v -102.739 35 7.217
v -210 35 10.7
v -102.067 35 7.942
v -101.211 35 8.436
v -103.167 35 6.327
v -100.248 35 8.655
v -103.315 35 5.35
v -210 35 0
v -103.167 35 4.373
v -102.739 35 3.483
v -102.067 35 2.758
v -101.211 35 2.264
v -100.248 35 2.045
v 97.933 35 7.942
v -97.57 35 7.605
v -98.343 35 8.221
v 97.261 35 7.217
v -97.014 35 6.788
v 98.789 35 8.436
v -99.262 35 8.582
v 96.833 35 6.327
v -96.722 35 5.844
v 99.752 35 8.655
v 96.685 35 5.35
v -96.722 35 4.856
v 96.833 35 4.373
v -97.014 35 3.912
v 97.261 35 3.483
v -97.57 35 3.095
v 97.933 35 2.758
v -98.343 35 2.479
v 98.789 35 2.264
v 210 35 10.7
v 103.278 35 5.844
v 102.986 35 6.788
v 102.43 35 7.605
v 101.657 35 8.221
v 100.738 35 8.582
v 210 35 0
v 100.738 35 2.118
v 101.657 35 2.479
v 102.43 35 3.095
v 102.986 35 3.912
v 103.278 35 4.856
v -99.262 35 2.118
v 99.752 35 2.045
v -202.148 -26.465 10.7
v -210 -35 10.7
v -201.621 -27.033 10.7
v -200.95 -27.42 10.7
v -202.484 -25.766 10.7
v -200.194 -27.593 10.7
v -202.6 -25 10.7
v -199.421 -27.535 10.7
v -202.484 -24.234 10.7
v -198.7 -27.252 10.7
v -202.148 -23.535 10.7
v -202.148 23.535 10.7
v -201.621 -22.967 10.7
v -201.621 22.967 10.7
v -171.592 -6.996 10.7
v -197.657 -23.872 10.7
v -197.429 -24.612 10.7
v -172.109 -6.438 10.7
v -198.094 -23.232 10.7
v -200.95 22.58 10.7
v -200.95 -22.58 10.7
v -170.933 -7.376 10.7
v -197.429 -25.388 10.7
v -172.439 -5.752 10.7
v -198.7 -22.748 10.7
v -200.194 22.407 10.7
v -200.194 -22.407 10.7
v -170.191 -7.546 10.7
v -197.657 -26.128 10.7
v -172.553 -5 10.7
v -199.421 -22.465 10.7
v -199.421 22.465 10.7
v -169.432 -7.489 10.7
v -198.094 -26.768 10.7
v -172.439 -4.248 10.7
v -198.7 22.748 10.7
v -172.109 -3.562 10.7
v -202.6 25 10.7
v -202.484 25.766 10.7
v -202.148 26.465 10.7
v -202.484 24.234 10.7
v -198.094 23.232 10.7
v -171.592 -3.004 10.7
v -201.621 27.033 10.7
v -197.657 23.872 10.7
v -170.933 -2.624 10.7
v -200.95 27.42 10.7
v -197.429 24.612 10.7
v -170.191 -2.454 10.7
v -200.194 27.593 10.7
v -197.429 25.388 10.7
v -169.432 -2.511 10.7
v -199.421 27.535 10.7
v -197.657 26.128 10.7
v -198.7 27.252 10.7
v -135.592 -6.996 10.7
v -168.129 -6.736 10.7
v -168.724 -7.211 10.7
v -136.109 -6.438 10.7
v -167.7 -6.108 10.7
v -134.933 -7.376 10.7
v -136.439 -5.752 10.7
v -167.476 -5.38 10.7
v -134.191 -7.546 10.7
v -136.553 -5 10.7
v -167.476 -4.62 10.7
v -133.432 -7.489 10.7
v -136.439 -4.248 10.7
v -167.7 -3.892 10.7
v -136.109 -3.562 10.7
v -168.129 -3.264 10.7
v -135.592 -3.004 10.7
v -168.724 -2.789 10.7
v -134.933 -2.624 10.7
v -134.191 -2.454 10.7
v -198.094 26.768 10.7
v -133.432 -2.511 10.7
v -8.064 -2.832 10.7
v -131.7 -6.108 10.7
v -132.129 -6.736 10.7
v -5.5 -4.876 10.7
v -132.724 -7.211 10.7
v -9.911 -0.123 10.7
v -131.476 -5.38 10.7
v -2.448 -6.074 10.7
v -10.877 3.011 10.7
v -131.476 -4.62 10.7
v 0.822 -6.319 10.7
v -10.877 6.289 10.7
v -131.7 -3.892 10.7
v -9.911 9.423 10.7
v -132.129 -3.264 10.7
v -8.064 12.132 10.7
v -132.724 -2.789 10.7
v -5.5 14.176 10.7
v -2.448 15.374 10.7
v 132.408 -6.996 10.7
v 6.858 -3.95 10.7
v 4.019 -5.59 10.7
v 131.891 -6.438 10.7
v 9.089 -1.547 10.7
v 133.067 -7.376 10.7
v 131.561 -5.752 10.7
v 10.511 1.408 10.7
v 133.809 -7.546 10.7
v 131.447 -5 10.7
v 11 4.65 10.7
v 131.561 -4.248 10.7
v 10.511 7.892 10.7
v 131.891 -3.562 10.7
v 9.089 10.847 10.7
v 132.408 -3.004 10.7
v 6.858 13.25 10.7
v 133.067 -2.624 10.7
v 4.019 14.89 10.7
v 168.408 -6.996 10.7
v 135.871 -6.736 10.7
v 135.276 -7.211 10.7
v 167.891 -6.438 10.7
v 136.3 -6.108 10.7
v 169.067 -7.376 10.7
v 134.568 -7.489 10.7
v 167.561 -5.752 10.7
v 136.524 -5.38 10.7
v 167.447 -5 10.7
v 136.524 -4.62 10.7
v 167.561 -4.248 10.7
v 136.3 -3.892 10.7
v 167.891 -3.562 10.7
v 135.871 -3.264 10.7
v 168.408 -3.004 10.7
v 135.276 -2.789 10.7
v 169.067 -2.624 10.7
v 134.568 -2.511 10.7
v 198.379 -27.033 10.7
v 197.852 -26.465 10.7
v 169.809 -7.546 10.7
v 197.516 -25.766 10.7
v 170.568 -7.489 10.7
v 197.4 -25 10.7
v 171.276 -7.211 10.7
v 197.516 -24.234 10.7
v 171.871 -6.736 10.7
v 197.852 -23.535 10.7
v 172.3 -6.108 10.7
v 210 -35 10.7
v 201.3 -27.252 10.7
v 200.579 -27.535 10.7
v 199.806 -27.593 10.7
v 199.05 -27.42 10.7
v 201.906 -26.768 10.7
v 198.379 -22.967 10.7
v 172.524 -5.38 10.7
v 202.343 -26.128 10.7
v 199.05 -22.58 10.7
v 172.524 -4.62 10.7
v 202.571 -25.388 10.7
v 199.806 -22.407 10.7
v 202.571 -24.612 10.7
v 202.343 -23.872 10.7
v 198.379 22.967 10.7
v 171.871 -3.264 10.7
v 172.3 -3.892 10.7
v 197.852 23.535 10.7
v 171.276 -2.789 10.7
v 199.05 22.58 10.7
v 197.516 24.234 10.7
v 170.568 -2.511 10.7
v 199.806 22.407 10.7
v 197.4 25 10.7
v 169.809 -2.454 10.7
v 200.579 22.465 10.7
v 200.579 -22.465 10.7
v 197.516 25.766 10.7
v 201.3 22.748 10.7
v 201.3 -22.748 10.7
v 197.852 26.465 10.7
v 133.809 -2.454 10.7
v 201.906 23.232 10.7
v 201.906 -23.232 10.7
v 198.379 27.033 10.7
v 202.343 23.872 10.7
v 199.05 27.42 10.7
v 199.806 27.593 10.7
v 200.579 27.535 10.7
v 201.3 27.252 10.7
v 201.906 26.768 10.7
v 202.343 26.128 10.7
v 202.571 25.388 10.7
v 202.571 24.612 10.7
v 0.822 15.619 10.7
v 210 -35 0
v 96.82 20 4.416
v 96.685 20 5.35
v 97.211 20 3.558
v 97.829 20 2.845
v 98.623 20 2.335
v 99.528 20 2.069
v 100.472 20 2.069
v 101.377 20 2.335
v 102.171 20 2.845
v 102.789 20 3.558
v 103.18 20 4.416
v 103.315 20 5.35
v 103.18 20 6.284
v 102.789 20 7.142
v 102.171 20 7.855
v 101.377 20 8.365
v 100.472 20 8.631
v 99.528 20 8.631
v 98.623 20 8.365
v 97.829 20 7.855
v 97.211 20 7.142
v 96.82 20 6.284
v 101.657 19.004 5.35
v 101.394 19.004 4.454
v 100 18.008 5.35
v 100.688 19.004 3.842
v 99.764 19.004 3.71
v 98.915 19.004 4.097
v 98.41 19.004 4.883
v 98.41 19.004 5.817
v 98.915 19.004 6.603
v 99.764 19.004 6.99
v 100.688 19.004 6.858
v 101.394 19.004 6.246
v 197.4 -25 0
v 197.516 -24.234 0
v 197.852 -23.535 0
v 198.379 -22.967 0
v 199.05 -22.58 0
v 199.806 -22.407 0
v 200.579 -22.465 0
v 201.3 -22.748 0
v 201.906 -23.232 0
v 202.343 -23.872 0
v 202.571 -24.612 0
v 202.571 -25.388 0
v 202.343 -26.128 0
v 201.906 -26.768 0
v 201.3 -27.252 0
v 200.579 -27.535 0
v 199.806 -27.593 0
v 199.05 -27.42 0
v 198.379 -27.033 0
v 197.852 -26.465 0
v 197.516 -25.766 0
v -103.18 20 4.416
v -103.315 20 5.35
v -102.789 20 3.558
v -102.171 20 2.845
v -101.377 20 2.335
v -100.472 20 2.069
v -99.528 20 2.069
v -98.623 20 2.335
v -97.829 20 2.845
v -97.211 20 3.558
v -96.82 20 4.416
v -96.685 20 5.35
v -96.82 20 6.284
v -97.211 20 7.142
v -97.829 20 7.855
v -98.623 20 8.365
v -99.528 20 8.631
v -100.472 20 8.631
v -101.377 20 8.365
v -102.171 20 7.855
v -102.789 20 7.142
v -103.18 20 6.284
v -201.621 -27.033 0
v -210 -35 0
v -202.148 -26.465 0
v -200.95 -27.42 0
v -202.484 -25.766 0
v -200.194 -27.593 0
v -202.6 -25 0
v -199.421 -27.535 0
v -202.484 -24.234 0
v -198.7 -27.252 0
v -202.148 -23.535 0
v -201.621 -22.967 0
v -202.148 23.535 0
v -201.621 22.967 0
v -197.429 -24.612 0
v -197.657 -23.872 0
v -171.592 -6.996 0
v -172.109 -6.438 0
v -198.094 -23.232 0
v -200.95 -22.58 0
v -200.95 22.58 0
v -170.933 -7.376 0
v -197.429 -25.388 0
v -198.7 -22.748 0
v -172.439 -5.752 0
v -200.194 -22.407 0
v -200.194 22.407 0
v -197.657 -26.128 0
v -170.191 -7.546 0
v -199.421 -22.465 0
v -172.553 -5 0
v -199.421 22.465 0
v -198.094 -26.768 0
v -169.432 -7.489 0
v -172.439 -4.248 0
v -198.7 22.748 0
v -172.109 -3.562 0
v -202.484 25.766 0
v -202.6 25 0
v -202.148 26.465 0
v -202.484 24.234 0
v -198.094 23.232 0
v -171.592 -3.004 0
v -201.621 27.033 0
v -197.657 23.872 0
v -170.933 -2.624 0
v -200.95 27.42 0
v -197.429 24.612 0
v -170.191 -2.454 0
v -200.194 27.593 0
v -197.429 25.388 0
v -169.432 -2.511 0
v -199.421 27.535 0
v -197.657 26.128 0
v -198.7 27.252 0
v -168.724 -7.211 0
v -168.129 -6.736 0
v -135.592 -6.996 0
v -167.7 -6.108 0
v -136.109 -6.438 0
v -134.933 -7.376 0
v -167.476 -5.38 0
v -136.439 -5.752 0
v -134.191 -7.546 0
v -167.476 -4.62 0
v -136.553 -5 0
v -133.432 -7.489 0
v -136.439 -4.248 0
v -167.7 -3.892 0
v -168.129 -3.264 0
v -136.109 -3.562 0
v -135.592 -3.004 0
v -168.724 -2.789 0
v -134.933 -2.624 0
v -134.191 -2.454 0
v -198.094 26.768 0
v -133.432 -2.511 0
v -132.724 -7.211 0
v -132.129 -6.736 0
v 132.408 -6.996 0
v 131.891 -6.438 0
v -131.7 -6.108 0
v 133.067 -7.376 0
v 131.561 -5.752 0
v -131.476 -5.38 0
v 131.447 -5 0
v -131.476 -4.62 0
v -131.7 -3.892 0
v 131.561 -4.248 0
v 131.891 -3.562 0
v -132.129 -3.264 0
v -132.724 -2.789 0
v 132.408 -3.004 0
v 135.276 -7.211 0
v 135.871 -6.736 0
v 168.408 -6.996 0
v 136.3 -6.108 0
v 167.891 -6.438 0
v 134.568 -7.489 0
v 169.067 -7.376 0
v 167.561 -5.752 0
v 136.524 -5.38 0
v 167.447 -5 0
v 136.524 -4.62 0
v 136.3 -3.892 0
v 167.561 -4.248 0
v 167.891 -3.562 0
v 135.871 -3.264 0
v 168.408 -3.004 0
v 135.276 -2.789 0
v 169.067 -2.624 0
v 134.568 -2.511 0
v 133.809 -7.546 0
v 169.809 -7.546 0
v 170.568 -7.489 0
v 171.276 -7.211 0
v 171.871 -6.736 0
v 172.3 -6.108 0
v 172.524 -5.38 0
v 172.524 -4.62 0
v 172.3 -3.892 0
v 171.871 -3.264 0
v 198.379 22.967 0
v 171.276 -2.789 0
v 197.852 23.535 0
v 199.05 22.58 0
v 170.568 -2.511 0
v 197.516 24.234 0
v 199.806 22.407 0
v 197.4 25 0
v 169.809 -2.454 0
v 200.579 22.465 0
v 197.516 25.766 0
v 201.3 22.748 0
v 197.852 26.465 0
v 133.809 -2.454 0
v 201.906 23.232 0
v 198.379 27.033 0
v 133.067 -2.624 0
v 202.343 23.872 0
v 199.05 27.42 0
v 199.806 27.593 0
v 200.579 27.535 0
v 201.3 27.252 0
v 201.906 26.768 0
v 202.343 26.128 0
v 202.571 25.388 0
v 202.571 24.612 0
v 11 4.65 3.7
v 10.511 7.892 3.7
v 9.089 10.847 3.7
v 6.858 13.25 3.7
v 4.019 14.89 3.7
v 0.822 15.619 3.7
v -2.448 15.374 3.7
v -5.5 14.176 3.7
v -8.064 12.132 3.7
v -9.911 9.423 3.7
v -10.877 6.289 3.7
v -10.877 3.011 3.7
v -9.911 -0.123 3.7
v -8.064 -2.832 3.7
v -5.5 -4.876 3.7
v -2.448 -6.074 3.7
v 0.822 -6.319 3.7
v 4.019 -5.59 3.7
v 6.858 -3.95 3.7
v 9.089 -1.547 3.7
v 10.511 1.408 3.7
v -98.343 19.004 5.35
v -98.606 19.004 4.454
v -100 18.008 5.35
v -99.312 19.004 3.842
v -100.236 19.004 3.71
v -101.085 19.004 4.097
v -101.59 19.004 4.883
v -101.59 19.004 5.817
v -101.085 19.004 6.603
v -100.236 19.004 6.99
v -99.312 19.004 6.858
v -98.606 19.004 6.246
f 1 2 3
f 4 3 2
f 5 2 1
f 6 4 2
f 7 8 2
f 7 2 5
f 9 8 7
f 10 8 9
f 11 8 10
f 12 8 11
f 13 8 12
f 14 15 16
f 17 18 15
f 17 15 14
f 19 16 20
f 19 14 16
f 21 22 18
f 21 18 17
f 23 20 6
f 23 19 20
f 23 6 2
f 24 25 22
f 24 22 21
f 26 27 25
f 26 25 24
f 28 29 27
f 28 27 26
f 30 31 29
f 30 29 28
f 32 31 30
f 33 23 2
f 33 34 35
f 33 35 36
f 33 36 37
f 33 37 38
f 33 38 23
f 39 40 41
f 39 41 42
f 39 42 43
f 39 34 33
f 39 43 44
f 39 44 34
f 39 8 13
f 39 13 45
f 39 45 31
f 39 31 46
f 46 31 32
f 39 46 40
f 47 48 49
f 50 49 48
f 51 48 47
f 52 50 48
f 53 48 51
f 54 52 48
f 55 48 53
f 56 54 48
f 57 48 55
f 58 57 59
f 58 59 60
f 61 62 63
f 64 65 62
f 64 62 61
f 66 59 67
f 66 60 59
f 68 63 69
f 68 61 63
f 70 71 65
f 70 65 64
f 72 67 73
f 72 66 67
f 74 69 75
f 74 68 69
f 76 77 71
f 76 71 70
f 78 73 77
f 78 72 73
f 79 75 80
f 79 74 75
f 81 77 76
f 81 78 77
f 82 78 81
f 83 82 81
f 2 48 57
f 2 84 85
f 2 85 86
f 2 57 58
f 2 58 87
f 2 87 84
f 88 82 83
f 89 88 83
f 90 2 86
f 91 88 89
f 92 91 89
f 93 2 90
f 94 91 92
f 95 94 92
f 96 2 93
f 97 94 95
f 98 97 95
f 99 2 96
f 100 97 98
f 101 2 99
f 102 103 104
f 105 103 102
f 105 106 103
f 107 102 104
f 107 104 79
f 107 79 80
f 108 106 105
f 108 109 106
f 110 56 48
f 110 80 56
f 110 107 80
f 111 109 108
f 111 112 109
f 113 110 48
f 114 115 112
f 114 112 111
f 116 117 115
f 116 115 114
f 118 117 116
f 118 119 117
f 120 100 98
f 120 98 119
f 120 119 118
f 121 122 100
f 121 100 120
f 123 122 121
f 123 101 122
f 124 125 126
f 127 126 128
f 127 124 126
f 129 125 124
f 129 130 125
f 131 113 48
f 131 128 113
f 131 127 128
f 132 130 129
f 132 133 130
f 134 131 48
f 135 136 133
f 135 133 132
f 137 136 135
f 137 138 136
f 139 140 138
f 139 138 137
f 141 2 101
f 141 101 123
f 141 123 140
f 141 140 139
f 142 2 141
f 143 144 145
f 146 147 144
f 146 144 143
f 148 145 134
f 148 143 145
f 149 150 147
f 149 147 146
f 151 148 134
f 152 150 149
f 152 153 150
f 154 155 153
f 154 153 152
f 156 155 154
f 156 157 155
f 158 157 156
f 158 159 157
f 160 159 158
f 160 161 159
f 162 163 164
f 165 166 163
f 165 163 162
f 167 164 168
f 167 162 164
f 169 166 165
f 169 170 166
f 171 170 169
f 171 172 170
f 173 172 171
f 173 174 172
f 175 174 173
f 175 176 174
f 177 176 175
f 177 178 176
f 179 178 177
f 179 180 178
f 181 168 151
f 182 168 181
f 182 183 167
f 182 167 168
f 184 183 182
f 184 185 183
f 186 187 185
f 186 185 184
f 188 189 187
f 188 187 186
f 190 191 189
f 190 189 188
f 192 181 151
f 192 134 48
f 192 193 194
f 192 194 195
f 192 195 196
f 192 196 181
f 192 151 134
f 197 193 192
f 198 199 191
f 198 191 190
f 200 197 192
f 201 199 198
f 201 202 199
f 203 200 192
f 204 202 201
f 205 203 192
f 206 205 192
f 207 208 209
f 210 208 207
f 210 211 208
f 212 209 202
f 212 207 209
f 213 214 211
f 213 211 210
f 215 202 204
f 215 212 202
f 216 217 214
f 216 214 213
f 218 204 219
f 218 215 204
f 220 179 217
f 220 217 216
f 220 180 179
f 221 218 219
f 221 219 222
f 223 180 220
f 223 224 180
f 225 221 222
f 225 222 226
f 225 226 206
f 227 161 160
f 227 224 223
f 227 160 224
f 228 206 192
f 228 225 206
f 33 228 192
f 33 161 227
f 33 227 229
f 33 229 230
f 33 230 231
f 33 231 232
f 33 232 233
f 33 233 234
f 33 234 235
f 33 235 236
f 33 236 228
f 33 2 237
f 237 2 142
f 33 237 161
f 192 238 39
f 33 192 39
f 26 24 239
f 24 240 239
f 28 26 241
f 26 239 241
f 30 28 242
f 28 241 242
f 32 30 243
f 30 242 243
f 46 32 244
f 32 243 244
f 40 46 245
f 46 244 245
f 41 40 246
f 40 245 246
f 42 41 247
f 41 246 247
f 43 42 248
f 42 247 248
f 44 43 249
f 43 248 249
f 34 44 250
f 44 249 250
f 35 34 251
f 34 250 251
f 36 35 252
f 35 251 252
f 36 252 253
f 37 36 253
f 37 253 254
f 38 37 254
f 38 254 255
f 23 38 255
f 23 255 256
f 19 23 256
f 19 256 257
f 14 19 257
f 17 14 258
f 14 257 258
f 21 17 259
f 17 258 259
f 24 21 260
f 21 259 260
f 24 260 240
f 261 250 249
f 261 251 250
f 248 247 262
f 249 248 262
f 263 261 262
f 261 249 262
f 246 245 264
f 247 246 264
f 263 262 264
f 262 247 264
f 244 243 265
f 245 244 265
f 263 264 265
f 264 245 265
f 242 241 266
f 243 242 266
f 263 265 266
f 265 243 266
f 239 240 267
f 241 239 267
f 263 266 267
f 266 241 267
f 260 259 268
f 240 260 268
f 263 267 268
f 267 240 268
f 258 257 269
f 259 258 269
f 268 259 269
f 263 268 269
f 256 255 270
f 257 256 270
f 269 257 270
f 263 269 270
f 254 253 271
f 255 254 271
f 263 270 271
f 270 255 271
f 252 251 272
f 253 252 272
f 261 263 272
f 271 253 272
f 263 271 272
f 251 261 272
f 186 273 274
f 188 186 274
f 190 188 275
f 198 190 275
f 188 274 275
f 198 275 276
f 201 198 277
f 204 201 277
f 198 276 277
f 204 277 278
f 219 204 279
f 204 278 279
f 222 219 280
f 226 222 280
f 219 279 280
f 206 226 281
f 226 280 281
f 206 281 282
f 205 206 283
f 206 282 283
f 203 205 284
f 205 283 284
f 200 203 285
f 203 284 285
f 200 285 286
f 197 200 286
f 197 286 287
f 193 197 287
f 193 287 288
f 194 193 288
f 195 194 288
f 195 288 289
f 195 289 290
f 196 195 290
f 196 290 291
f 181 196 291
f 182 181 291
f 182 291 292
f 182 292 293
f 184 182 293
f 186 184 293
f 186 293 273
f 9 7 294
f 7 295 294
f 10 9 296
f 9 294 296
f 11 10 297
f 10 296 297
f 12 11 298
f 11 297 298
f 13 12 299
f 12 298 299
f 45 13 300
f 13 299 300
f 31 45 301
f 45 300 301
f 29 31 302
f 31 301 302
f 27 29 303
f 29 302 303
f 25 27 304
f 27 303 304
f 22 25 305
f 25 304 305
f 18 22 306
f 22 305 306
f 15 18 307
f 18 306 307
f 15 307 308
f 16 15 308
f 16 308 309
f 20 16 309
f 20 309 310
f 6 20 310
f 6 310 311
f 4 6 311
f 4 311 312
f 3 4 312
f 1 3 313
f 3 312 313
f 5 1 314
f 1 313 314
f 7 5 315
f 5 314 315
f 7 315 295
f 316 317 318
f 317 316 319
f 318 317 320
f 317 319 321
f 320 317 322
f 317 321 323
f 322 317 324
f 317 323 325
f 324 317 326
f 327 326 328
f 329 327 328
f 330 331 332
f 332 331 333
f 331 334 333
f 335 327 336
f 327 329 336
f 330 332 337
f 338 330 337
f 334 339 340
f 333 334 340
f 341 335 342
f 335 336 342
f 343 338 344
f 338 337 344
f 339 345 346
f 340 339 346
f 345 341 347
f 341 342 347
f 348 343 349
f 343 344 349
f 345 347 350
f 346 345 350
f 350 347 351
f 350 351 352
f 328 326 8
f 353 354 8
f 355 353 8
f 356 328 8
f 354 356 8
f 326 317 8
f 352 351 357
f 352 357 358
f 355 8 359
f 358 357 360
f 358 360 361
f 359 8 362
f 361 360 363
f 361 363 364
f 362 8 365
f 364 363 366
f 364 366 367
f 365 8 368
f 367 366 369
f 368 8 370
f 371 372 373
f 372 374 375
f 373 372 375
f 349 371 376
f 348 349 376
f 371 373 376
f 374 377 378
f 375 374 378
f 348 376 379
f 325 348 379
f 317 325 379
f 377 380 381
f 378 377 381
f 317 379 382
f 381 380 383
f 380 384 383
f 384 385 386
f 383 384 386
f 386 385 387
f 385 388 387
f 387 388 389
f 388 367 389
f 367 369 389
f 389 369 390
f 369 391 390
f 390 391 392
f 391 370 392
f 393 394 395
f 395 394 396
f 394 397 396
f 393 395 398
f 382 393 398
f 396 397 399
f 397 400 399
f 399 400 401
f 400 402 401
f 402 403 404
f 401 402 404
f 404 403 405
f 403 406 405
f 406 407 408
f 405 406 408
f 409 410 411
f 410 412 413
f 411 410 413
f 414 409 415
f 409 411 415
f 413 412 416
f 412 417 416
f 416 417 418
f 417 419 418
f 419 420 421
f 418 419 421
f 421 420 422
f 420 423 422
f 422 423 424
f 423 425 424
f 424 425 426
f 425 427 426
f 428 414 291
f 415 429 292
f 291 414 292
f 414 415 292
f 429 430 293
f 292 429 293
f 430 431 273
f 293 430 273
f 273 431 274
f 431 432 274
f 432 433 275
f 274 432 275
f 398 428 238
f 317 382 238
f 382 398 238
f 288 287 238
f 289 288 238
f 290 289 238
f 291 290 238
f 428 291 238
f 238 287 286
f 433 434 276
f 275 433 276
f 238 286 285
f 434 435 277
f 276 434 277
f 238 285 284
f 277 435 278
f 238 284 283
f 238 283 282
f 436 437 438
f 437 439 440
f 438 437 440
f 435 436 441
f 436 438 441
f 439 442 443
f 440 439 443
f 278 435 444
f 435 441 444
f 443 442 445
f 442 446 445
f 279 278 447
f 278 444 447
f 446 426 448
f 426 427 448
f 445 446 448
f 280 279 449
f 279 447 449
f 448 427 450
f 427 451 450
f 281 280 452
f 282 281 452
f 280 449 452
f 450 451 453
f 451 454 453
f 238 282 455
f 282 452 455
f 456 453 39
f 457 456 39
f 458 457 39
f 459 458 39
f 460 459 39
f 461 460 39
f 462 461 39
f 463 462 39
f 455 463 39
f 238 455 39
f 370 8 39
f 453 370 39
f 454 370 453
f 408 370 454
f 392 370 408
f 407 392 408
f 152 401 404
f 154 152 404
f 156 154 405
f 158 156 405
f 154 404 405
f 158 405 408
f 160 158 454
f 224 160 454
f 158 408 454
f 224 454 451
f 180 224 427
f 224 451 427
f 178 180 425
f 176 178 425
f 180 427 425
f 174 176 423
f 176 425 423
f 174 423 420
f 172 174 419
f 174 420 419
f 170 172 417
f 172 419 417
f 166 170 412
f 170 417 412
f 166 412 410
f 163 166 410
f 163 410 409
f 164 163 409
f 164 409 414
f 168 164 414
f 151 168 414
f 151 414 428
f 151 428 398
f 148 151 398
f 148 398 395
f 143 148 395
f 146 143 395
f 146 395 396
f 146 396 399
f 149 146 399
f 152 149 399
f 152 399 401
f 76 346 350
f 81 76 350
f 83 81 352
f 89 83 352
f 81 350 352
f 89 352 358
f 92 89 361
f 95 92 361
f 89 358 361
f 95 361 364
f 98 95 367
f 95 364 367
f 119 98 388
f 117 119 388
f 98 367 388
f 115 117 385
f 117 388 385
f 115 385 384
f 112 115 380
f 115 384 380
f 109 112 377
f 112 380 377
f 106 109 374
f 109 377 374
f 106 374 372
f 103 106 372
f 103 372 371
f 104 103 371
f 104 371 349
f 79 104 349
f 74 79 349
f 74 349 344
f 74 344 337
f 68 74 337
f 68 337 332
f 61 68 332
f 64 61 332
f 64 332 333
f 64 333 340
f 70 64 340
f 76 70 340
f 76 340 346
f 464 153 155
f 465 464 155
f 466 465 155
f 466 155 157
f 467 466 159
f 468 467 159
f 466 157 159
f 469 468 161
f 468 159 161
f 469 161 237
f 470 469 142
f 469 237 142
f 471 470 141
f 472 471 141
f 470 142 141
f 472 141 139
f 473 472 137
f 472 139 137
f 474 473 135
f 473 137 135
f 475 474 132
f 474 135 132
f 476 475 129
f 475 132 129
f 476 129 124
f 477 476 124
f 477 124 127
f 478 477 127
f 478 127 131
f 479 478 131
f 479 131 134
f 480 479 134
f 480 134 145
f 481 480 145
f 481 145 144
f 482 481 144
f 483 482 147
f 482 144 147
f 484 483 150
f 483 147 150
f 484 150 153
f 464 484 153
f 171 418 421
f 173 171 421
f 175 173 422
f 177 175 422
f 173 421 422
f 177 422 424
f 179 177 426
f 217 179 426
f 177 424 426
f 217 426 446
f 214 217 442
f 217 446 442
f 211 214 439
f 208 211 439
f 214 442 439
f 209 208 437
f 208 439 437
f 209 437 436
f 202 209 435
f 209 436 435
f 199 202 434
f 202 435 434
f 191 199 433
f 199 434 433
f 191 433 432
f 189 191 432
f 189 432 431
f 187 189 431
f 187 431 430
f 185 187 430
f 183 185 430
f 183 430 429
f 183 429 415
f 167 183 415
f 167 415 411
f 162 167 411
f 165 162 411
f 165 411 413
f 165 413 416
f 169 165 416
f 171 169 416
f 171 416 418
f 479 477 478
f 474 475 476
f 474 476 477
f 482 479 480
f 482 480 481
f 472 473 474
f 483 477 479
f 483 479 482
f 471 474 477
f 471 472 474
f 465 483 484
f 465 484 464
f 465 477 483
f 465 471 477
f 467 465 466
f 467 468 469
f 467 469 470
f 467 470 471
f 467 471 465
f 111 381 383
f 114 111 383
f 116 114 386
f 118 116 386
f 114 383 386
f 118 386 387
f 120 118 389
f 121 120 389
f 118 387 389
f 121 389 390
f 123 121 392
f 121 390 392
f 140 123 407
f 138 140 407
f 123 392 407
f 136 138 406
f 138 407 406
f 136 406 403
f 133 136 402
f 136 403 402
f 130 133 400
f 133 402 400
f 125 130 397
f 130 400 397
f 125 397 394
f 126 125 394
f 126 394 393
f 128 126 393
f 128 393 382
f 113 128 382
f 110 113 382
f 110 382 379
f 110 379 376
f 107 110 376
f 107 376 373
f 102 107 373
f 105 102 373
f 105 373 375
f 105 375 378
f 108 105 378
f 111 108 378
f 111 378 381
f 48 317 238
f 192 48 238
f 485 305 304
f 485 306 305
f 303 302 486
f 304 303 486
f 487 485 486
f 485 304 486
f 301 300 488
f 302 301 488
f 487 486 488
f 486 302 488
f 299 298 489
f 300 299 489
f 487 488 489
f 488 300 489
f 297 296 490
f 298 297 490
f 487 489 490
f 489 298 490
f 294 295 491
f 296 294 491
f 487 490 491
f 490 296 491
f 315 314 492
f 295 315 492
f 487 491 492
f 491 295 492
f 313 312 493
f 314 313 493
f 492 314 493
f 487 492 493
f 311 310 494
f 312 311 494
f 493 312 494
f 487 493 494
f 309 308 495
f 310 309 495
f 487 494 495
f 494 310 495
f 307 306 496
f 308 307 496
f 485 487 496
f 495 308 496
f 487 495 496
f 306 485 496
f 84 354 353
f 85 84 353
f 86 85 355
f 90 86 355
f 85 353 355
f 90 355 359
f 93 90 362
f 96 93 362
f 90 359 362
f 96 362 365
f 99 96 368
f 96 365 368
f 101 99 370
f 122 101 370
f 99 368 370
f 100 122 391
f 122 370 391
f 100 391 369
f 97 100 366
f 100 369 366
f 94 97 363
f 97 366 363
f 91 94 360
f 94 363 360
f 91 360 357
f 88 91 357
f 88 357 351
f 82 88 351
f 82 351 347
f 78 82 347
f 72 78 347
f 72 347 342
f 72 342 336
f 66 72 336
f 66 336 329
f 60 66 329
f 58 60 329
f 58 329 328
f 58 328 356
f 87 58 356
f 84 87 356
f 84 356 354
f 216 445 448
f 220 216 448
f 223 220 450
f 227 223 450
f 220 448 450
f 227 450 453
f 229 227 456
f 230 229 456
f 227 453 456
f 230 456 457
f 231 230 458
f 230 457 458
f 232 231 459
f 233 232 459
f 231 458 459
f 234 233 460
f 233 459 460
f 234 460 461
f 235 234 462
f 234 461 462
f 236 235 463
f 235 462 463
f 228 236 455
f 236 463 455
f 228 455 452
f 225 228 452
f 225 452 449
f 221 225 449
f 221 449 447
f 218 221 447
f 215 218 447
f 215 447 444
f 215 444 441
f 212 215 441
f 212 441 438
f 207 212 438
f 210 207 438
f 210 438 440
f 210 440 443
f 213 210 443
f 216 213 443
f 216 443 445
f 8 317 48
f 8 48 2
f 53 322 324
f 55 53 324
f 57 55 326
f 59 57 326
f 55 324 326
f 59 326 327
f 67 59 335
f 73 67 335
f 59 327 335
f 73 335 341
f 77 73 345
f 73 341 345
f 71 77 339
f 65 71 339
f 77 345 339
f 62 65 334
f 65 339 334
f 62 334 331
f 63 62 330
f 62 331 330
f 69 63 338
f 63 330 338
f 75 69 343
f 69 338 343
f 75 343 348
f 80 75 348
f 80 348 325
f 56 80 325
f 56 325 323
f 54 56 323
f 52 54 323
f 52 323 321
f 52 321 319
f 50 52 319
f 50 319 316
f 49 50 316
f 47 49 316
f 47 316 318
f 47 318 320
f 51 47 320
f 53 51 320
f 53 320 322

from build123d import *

# Parameters (mm, degrees)
ESBO_O1_W                                   = 420
ESBO_O1_H                                   = 70
RESSALTO_EXTRUS_O1_DEPTH                    = 10.7
ESBO_O5_R                                   = 11
CORTE_EXTRUS_O4_DEPTH                       = 7
FURO_ROSCADO_PARA_CONDU_TE_DE_10_321_D      = 5.1054
FURO_ROSCADO_PARA_CONDU_TE_DE_M5X0_81_D     = 5.2
FURO_ROSCADO_PARA_CONDU_TE_DE_1_4_281_D     = 6.6294
FURO_ROSCADO_PARA_CONDU_TE_DE_1_4_281_DEPTH = 15
FURO_ROSCADO_PARA_CONDU_TE_DE_1_4_281_TIP   = 1.991672694


with BuildPart() as part:
    # Esboço1 → Ressalto-extrusão1 (new body)
    with BuildSketch(Plane.XY):
        Rectangle(ESBO_O1_W, ESBO_O1_H)
    extrude(amount=RESSALTO_EXTRUS_O1_DEPTH)

    # Esboço5 → Corte-extrusão4 (cut)
    with BuildSketch(Plane.XY.offset(10.7)):
        with Locations((0, 4.65)):
            Circle(ESBO_O5_R)
    extrude(amount=-CORTE_EXTRUS_O4_DEPTH, mode=Mode.SUBTRACT)

    # Furo roscado para conduíte de #10-321 (through all)
    with Locations(Plane.XY.offset(10.7)):
        with Locations((-170, -5), (-134, -5), (134, -5), (170, -5)):
            Hole(FURO_ROSCADO_PARA_CONDU_TE_DE_10_321_D / 2)

    # Furo roscado para conduíte de M5x0.81 (through all)
    with Locations(Plane.XY.offset(10.7)):
        with Locations((-200, 25), (-200, -25), (200, -25), (200, 25)):
            Hole(FURO_ROSCADO_PARA_CONDU_TE_DE_M5X0_81_D / 2)

    # Furo roscado para conduíte de 1/4-281
    with Locations(Plane(origin=(0, 35, 0), x_dir=(1, 0, 0), z_dir=(0, 1, 0))):
        with Locations((-100, -5.35), (100, -5.35)):
            Hole(FURO_ROSCADO_PARA_CONDU_TE_DE_1_4_281_D / 2, depth=FURO_ROSCADO_PARA_CONDU_TE_DE_1_4_281_DEPTH)
            with Locations((0, 0, -(FURO_ROSCADO_PARA_CONDU_TE_DE_1_4_281_DEPTH + FURO_ROSCADO_PARA_CONDU_TE_DE_1_4_281_TIP / 2))):  # 118° drill point
                Cone(0, FURO_ROSCADO_PARA_CONDU_TE_DE_1_4_281_D / 2, FURO_ROSCADO_PARA_CONDU_TE_DE_1_4_281_TIP, mode=Mode.SUBTRACT)


solid = part.part
